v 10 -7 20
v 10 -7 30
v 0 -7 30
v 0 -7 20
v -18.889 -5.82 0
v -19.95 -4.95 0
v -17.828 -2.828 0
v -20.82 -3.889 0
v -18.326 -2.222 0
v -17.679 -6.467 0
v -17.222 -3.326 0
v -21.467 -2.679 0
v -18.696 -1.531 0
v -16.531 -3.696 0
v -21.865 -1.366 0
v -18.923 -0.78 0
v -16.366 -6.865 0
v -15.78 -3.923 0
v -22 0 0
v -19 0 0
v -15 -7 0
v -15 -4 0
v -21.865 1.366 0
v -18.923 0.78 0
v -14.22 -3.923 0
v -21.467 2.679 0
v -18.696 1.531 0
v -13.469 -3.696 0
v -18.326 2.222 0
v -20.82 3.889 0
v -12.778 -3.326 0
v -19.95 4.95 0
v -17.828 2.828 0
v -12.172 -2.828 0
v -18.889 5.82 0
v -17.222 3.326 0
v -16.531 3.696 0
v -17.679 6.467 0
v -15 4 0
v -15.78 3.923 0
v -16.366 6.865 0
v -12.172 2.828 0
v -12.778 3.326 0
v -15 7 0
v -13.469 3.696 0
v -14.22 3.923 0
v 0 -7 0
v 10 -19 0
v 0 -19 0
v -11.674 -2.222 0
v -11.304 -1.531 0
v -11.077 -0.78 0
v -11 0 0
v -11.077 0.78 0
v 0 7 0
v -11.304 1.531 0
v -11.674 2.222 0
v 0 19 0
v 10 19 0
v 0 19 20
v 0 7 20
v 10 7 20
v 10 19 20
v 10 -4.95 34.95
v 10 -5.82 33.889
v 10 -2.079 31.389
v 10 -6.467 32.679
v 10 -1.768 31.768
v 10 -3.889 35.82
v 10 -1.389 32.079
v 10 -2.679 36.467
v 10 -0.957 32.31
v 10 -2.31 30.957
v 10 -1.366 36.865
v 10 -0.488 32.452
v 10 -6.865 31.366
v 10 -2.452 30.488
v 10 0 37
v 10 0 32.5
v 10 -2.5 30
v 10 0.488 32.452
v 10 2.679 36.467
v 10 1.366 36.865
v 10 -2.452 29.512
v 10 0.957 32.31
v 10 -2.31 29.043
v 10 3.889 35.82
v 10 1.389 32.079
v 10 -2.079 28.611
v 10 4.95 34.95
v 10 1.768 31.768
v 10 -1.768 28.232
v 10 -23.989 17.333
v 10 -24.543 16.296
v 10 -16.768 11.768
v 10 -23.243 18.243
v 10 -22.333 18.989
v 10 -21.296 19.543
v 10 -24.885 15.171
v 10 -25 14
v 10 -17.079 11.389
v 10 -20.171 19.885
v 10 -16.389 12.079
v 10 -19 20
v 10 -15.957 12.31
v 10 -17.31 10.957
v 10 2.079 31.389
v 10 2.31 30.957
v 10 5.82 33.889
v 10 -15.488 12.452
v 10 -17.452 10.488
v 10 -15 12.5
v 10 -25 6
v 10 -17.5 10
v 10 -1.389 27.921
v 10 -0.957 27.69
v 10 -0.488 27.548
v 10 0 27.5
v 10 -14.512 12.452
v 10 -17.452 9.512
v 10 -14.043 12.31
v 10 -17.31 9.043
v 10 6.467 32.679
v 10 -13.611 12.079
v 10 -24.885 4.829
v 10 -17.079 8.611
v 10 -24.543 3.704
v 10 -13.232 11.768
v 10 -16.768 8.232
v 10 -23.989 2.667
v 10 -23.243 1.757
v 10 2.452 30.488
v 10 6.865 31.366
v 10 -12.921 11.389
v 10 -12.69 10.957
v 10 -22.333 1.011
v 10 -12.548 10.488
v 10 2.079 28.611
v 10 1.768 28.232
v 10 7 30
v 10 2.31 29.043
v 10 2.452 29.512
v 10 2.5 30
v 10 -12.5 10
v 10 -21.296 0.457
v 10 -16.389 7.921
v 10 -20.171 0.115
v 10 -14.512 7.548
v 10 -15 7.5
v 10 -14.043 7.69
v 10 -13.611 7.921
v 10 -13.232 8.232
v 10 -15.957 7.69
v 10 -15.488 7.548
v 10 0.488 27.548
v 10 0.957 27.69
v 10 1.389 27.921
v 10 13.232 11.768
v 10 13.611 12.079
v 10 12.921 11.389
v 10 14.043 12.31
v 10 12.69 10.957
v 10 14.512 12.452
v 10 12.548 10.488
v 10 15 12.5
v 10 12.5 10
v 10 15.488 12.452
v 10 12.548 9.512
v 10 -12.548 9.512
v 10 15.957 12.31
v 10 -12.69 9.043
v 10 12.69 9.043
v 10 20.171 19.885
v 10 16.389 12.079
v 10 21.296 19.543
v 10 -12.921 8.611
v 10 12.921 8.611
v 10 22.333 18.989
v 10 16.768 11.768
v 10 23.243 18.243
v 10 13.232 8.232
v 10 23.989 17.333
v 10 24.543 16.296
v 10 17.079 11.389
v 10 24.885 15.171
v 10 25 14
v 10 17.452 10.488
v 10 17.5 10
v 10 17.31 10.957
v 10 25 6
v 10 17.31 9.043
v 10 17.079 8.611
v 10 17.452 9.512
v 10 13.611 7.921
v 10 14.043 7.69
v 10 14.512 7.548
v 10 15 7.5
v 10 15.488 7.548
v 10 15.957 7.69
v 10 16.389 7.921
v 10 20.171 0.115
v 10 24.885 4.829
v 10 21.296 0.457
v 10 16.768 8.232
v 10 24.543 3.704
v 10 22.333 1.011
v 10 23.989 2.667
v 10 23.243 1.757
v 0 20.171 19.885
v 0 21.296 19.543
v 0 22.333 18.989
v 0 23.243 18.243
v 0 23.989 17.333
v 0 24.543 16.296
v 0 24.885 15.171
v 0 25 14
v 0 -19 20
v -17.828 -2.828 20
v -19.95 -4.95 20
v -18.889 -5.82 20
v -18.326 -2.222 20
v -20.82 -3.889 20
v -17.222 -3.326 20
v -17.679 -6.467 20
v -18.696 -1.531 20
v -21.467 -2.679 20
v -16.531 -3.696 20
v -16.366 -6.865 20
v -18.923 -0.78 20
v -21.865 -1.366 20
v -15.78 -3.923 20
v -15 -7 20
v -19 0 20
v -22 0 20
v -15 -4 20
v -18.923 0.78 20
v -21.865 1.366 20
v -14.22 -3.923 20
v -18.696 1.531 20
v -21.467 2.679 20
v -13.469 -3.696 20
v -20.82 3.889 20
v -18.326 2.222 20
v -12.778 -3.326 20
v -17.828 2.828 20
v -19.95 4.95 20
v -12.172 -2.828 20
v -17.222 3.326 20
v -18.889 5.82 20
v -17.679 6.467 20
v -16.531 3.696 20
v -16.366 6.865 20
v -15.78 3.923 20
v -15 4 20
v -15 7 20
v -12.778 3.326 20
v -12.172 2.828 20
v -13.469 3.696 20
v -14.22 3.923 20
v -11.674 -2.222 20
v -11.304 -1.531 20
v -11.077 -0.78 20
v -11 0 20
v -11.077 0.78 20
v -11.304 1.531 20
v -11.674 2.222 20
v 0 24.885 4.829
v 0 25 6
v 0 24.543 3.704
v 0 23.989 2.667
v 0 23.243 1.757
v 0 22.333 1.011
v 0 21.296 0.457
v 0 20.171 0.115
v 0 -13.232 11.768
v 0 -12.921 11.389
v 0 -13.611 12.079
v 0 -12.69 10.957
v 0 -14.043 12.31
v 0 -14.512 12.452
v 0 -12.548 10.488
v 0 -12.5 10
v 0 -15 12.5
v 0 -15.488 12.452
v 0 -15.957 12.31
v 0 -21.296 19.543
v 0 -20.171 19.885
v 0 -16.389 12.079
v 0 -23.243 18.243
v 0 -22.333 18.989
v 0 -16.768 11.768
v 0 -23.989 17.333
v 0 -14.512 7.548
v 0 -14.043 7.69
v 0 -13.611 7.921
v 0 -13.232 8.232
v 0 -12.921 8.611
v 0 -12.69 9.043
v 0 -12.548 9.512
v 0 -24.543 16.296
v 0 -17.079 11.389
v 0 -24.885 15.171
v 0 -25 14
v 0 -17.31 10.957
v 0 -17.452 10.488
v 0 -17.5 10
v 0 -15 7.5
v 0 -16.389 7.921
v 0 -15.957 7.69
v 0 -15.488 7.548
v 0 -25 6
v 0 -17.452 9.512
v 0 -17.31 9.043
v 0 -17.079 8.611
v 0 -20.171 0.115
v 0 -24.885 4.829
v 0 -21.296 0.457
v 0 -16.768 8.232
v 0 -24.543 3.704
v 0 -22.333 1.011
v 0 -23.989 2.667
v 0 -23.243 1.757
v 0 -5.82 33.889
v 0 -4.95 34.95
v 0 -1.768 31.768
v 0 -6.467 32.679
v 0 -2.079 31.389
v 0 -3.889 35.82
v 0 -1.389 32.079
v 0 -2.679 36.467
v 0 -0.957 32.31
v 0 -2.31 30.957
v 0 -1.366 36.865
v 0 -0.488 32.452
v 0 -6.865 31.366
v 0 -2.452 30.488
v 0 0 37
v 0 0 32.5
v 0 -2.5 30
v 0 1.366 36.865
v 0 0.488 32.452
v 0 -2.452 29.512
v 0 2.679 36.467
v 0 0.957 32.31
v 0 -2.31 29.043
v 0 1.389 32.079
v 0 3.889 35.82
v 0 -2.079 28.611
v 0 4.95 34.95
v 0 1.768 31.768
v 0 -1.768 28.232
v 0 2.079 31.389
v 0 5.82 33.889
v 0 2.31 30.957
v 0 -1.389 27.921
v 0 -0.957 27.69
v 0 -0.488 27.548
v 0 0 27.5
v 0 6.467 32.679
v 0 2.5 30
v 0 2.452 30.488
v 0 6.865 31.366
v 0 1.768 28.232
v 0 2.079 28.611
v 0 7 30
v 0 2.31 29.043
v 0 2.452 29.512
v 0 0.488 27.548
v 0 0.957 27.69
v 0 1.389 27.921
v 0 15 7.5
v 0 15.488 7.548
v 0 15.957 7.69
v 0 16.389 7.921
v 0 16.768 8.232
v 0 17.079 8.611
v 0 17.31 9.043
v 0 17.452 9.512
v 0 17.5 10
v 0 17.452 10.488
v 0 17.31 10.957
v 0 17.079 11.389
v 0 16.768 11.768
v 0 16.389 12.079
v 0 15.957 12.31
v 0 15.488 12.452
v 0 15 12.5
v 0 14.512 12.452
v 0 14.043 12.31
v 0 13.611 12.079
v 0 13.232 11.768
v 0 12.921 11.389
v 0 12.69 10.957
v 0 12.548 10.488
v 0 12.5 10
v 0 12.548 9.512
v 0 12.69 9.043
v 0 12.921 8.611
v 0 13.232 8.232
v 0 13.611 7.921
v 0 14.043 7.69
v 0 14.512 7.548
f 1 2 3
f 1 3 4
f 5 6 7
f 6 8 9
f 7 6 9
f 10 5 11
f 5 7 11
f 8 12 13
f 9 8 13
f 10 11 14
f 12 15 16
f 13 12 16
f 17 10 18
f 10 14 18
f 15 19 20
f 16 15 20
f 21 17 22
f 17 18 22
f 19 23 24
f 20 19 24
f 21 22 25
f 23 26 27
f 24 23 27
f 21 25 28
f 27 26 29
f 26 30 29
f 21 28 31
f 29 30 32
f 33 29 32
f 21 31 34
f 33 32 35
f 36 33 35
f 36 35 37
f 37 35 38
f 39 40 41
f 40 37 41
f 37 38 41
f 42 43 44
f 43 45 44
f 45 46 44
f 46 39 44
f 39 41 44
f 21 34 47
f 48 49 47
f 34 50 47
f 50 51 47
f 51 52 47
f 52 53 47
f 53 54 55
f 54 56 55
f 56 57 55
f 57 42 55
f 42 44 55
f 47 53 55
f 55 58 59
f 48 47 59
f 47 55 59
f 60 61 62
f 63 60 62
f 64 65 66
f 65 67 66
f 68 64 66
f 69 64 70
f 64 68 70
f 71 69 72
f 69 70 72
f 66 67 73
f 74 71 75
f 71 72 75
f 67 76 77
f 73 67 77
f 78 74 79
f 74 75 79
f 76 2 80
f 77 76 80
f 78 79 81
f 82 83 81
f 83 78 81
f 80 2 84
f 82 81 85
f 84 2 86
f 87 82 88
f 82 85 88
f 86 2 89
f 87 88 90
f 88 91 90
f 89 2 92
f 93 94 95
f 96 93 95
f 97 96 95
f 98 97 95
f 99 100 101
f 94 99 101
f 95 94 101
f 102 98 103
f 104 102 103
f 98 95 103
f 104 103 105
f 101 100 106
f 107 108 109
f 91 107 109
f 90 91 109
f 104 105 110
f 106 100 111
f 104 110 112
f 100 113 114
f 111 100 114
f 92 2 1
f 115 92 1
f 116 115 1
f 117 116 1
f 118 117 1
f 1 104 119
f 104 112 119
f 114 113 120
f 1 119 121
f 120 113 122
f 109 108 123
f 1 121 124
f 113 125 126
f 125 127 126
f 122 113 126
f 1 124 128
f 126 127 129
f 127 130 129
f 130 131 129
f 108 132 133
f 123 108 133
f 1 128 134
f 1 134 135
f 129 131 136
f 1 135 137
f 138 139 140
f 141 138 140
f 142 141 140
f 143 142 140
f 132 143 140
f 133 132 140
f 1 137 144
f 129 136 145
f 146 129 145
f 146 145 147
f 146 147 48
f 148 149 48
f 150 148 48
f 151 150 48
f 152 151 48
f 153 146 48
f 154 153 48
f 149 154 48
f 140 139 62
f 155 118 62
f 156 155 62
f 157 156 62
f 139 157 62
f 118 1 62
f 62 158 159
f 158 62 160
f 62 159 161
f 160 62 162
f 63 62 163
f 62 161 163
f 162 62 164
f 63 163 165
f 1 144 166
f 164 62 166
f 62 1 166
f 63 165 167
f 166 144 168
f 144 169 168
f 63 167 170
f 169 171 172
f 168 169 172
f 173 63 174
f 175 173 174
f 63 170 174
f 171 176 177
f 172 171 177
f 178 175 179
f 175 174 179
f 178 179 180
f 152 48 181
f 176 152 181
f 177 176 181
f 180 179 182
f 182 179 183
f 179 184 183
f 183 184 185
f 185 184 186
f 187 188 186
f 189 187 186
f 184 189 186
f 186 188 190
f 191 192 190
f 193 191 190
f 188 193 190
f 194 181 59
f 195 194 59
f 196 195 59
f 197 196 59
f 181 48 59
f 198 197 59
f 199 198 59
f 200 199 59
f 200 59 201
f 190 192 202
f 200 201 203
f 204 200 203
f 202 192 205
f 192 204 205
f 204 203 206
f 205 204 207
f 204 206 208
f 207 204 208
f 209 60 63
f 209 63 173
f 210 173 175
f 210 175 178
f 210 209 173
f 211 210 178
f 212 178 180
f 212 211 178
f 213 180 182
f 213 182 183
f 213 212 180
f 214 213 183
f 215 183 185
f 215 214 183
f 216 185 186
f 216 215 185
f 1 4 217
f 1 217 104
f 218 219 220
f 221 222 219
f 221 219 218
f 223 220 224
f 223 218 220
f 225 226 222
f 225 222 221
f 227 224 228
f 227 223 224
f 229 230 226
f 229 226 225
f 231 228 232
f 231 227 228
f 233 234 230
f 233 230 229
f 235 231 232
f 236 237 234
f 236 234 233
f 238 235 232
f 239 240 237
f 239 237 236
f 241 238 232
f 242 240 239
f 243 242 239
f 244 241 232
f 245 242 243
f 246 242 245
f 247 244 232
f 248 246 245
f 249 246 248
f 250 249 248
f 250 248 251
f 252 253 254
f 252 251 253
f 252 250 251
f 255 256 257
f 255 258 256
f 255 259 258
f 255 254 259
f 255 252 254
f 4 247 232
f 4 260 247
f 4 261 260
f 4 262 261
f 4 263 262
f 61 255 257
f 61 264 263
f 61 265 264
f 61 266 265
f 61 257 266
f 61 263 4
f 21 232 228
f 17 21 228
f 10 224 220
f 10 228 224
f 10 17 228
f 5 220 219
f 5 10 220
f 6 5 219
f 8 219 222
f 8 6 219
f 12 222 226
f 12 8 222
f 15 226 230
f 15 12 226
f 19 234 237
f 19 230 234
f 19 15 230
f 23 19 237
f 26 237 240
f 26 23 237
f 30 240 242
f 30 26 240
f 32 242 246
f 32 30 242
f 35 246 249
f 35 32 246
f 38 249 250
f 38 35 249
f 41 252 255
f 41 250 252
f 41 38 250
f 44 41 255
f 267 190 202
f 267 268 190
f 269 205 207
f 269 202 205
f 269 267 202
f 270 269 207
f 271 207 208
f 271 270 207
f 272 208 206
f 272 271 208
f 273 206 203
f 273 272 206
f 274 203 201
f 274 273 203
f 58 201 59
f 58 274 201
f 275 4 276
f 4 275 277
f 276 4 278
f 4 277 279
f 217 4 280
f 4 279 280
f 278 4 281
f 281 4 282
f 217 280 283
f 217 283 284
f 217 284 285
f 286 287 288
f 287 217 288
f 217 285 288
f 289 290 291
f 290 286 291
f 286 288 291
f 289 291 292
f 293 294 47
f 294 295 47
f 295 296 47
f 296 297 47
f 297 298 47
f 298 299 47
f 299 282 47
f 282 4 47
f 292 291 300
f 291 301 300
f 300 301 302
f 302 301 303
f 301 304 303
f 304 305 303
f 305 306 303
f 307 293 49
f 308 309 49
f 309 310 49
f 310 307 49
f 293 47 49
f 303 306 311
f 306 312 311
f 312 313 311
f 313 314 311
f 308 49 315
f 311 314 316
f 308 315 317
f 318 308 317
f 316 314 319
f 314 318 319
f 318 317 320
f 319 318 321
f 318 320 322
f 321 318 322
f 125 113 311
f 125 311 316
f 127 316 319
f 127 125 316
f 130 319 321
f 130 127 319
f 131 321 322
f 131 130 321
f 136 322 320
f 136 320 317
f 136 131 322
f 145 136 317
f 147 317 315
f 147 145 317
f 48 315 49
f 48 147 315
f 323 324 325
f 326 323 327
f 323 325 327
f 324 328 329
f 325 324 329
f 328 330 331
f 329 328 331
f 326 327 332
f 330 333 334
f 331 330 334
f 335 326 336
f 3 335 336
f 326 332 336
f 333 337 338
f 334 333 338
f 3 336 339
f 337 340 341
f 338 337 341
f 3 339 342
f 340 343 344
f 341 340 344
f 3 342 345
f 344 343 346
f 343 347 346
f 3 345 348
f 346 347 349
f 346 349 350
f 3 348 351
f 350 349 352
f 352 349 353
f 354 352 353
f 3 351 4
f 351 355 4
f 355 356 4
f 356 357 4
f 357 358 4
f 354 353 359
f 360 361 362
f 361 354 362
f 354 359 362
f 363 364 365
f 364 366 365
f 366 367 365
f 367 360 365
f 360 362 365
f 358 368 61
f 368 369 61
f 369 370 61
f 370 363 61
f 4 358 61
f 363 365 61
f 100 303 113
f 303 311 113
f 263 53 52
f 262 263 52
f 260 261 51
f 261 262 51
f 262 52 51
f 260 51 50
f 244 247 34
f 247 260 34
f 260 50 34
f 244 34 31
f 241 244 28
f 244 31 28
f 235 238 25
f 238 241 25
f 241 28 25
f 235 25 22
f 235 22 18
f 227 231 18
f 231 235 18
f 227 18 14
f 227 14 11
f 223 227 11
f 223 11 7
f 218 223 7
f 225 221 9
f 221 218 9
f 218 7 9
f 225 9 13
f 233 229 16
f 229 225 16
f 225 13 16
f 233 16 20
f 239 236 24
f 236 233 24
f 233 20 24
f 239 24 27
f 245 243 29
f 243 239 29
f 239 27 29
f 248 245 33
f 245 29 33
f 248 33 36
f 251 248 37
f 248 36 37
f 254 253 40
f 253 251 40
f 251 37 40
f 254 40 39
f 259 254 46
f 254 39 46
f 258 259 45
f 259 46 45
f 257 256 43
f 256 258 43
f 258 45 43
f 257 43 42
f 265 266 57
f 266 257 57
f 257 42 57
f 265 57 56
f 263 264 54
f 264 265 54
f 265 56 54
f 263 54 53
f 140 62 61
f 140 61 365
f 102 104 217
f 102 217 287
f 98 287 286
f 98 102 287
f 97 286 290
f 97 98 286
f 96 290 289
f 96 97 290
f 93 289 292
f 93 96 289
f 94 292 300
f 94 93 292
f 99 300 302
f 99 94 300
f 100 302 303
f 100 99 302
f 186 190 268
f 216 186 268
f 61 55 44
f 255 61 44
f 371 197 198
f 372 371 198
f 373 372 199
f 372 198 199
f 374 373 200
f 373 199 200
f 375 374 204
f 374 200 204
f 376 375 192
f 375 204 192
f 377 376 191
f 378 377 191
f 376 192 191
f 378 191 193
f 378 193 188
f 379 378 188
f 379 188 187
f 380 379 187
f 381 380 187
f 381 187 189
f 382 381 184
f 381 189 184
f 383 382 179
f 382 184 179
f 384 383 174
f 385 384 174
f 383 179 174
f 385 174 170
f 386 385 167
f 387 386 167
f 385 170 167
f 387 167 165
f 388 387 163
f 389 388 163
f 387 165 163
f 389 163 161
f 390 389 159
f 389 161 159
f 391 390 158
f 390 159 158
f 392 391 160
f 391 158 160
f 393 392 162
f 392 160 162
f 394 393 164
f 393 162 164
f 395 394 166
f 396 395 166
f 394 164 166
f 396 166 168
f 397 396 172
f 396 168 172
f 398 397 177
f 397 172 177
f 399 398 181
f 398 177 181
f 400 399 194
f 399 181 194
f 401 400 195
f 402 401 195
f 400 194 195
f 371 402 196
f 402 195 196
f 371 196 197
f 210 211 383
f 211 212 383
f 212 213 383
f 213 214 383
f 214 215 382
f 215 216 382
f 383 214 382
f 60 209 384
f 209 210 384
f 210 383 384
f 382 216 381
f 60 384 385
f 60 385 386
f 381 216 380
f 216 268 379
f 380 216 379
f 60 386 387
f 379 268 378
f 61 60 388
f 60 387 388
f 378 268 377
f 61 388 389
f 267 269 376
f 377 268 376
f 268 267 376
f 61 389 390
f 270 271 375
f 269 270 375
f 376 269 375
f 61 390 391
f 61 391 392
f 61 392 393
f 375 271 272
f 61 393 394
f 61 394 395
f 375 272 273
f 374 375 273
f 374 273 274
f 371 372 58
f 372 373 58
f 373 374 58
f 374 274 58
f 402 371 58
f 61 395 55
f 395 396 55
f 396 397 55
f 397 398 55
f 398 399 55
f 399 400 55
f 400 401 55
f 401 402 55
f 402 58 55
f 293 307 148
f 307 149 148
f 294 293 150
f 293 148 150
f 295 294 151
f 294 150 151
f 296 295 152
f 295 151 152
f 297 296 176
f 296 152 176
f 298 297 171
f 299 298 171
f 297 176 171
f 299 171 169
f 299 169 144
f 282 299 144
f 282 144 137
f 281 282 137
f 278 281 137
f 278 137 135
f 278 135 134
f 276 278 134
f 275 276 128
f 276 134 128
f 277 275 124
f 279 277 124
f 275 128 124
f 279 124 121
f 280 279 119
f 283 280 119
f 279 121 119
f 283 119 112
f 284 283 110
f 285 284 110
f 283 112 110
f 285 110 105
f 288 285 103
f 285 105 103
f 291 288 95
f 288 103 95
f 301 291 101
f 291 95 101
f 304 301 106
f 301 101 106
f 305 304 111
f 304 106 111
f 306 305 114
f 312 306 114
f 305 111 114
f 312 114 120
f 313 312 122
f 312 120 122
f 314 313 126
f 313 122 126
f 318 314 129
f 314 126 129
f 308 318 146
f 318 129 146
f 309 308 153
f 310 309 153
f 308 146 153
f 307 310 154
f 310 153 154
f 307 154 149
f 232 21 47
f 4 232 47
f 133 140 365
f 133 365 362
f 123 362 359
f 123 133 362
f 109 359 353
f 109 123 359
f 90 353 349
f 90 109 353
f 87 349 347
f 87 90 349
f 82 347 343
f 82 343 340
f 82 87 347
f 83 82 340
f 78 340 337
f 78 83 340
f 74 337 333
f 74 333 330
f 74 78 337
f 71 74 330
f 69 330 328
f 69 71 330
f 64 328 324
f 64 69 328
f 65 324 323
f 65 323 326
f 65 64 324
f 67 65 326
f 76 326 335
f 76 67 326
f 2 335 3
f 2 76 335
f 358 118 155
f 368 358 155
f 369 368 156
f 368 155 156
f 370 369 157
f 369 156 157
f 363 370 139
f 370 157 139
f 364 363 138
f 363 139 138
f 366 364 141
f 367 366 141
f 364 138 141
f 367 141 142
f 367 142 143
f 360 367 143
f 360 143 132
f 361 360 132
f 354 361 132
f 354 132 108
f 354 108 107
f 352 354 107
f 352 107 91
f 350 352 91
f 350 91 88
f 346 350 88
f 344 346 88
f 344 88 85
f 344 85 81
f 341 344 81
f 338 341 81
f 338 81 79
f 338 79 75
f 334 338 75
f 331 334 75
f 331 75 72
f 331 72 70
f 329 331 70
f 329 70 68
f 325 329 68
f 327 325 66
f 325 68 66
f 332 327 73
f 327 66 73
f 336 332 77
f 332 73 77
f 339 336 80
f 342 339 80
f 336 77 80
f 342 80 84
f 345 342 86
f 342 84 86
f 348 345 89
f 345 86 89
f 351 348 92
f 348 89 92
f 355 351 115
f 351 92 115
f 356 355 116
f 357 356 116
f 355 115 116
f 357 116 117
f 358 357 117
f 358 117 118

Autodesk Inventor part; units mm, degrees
ref_plane "YZ Plane" through (0, 0, 0) normal (1, 0, 0) x (0, 1, 0)
ref_plane "XZ Plane" through (0, 0, 0) normal (0, 1, 0) x (-1, 0, 0)
ref_plane "XY Plane" through (0, 0, 0) normal (0, 0, 1) x (1, 0, 0)
sketch "Sketch1" plane through (0, 0, 0) normal (0, 0, 1) x (1, 0, 0)
  line L0 (0, 0) -> (-15, 0) construction
  circle A0 centre (-15, 0) radius 4
  line L1 (10, 25) -> (0, 25)
  line L2 (0, 25) -> (0, -25)
  line L3 (0, -25) -> (10, -25)
  line L4 (10, -25) -> (10, 25)
  line L5 (0, 0) -> (-15, 0) construction
  line L6 (0, 7) -> (-15, 7)
  line L7 (-15, -7) -> (0, -7)
  arc A1 (0, -7) -> (0, 7) centre (0, 0) ccw
  arc A2 (-15, 7) -> (-15, -7) centre (-15, 0) ccw
  point P0 (-7.5, 0)
  dimension "d0" = 8
  dimension "d1" = 15
  dimension "d2" = 50
  dimension "d3" = 10
  dimension "d4" = 7
extrude "Extrusion1" add sketch "Sketch1" along normal blind 20
sketch "Sketch2" plane through (10, -25, 0) normal (1, 0, 0) x (0, 0, -1)
  line L0 (0, 50) -> (-20, 50) construction
  line L1 (-10, 50) -> (-10, 40) construction
  line L2 (0, 0) -> (-20, 0) construction
  line L3 (-10, 0) -> (-10, 10) construction
  circle A0 centre (-10, 40) radius 2.5
  circle A1 centre (-10, 10) radius 2.5
  point P0 (0, 25)
  dimension "d7" = 5
  dimension "d8" = 10
extrude "Extrusion2" cut sketch "Sketch2" against normal through all
fillet "Fillet1" radius 6 4 edges at (5, 25, 20) (5, 25, 0) (5, -25, 20) (5, -25, 0)
sketch "Sketch3" plane through (10, -19, 0) normal (1, 0, 0) x (0, 0, -1)
  line L0 (-20, 15) -> (-20, 23) projected
  line L1 (-20, 19) -> (-30, 19) construction
  line L2 (-20, 26) -> (-30, 26)
  line L3 (-30, 12) -> (-20, 12)
  arc A0 (-20, 12) -> (-20, 26) centre (-20, 19) ccw
  arc A1 (-30, 26) -> (-30, 12) centre (-30, 19) ccw
  circle A2 centre (-30, 19) radius 2.5
  point P0 (0, 19)
  point P1 (-25, 19)
  dimension "d12" = 5
  dimension "d13" = 7
  dimension "d14" = 10
extrude "Extrusion3" add sketch "Sketch3" against normal blind 10
properties part number "frame mount 1"
